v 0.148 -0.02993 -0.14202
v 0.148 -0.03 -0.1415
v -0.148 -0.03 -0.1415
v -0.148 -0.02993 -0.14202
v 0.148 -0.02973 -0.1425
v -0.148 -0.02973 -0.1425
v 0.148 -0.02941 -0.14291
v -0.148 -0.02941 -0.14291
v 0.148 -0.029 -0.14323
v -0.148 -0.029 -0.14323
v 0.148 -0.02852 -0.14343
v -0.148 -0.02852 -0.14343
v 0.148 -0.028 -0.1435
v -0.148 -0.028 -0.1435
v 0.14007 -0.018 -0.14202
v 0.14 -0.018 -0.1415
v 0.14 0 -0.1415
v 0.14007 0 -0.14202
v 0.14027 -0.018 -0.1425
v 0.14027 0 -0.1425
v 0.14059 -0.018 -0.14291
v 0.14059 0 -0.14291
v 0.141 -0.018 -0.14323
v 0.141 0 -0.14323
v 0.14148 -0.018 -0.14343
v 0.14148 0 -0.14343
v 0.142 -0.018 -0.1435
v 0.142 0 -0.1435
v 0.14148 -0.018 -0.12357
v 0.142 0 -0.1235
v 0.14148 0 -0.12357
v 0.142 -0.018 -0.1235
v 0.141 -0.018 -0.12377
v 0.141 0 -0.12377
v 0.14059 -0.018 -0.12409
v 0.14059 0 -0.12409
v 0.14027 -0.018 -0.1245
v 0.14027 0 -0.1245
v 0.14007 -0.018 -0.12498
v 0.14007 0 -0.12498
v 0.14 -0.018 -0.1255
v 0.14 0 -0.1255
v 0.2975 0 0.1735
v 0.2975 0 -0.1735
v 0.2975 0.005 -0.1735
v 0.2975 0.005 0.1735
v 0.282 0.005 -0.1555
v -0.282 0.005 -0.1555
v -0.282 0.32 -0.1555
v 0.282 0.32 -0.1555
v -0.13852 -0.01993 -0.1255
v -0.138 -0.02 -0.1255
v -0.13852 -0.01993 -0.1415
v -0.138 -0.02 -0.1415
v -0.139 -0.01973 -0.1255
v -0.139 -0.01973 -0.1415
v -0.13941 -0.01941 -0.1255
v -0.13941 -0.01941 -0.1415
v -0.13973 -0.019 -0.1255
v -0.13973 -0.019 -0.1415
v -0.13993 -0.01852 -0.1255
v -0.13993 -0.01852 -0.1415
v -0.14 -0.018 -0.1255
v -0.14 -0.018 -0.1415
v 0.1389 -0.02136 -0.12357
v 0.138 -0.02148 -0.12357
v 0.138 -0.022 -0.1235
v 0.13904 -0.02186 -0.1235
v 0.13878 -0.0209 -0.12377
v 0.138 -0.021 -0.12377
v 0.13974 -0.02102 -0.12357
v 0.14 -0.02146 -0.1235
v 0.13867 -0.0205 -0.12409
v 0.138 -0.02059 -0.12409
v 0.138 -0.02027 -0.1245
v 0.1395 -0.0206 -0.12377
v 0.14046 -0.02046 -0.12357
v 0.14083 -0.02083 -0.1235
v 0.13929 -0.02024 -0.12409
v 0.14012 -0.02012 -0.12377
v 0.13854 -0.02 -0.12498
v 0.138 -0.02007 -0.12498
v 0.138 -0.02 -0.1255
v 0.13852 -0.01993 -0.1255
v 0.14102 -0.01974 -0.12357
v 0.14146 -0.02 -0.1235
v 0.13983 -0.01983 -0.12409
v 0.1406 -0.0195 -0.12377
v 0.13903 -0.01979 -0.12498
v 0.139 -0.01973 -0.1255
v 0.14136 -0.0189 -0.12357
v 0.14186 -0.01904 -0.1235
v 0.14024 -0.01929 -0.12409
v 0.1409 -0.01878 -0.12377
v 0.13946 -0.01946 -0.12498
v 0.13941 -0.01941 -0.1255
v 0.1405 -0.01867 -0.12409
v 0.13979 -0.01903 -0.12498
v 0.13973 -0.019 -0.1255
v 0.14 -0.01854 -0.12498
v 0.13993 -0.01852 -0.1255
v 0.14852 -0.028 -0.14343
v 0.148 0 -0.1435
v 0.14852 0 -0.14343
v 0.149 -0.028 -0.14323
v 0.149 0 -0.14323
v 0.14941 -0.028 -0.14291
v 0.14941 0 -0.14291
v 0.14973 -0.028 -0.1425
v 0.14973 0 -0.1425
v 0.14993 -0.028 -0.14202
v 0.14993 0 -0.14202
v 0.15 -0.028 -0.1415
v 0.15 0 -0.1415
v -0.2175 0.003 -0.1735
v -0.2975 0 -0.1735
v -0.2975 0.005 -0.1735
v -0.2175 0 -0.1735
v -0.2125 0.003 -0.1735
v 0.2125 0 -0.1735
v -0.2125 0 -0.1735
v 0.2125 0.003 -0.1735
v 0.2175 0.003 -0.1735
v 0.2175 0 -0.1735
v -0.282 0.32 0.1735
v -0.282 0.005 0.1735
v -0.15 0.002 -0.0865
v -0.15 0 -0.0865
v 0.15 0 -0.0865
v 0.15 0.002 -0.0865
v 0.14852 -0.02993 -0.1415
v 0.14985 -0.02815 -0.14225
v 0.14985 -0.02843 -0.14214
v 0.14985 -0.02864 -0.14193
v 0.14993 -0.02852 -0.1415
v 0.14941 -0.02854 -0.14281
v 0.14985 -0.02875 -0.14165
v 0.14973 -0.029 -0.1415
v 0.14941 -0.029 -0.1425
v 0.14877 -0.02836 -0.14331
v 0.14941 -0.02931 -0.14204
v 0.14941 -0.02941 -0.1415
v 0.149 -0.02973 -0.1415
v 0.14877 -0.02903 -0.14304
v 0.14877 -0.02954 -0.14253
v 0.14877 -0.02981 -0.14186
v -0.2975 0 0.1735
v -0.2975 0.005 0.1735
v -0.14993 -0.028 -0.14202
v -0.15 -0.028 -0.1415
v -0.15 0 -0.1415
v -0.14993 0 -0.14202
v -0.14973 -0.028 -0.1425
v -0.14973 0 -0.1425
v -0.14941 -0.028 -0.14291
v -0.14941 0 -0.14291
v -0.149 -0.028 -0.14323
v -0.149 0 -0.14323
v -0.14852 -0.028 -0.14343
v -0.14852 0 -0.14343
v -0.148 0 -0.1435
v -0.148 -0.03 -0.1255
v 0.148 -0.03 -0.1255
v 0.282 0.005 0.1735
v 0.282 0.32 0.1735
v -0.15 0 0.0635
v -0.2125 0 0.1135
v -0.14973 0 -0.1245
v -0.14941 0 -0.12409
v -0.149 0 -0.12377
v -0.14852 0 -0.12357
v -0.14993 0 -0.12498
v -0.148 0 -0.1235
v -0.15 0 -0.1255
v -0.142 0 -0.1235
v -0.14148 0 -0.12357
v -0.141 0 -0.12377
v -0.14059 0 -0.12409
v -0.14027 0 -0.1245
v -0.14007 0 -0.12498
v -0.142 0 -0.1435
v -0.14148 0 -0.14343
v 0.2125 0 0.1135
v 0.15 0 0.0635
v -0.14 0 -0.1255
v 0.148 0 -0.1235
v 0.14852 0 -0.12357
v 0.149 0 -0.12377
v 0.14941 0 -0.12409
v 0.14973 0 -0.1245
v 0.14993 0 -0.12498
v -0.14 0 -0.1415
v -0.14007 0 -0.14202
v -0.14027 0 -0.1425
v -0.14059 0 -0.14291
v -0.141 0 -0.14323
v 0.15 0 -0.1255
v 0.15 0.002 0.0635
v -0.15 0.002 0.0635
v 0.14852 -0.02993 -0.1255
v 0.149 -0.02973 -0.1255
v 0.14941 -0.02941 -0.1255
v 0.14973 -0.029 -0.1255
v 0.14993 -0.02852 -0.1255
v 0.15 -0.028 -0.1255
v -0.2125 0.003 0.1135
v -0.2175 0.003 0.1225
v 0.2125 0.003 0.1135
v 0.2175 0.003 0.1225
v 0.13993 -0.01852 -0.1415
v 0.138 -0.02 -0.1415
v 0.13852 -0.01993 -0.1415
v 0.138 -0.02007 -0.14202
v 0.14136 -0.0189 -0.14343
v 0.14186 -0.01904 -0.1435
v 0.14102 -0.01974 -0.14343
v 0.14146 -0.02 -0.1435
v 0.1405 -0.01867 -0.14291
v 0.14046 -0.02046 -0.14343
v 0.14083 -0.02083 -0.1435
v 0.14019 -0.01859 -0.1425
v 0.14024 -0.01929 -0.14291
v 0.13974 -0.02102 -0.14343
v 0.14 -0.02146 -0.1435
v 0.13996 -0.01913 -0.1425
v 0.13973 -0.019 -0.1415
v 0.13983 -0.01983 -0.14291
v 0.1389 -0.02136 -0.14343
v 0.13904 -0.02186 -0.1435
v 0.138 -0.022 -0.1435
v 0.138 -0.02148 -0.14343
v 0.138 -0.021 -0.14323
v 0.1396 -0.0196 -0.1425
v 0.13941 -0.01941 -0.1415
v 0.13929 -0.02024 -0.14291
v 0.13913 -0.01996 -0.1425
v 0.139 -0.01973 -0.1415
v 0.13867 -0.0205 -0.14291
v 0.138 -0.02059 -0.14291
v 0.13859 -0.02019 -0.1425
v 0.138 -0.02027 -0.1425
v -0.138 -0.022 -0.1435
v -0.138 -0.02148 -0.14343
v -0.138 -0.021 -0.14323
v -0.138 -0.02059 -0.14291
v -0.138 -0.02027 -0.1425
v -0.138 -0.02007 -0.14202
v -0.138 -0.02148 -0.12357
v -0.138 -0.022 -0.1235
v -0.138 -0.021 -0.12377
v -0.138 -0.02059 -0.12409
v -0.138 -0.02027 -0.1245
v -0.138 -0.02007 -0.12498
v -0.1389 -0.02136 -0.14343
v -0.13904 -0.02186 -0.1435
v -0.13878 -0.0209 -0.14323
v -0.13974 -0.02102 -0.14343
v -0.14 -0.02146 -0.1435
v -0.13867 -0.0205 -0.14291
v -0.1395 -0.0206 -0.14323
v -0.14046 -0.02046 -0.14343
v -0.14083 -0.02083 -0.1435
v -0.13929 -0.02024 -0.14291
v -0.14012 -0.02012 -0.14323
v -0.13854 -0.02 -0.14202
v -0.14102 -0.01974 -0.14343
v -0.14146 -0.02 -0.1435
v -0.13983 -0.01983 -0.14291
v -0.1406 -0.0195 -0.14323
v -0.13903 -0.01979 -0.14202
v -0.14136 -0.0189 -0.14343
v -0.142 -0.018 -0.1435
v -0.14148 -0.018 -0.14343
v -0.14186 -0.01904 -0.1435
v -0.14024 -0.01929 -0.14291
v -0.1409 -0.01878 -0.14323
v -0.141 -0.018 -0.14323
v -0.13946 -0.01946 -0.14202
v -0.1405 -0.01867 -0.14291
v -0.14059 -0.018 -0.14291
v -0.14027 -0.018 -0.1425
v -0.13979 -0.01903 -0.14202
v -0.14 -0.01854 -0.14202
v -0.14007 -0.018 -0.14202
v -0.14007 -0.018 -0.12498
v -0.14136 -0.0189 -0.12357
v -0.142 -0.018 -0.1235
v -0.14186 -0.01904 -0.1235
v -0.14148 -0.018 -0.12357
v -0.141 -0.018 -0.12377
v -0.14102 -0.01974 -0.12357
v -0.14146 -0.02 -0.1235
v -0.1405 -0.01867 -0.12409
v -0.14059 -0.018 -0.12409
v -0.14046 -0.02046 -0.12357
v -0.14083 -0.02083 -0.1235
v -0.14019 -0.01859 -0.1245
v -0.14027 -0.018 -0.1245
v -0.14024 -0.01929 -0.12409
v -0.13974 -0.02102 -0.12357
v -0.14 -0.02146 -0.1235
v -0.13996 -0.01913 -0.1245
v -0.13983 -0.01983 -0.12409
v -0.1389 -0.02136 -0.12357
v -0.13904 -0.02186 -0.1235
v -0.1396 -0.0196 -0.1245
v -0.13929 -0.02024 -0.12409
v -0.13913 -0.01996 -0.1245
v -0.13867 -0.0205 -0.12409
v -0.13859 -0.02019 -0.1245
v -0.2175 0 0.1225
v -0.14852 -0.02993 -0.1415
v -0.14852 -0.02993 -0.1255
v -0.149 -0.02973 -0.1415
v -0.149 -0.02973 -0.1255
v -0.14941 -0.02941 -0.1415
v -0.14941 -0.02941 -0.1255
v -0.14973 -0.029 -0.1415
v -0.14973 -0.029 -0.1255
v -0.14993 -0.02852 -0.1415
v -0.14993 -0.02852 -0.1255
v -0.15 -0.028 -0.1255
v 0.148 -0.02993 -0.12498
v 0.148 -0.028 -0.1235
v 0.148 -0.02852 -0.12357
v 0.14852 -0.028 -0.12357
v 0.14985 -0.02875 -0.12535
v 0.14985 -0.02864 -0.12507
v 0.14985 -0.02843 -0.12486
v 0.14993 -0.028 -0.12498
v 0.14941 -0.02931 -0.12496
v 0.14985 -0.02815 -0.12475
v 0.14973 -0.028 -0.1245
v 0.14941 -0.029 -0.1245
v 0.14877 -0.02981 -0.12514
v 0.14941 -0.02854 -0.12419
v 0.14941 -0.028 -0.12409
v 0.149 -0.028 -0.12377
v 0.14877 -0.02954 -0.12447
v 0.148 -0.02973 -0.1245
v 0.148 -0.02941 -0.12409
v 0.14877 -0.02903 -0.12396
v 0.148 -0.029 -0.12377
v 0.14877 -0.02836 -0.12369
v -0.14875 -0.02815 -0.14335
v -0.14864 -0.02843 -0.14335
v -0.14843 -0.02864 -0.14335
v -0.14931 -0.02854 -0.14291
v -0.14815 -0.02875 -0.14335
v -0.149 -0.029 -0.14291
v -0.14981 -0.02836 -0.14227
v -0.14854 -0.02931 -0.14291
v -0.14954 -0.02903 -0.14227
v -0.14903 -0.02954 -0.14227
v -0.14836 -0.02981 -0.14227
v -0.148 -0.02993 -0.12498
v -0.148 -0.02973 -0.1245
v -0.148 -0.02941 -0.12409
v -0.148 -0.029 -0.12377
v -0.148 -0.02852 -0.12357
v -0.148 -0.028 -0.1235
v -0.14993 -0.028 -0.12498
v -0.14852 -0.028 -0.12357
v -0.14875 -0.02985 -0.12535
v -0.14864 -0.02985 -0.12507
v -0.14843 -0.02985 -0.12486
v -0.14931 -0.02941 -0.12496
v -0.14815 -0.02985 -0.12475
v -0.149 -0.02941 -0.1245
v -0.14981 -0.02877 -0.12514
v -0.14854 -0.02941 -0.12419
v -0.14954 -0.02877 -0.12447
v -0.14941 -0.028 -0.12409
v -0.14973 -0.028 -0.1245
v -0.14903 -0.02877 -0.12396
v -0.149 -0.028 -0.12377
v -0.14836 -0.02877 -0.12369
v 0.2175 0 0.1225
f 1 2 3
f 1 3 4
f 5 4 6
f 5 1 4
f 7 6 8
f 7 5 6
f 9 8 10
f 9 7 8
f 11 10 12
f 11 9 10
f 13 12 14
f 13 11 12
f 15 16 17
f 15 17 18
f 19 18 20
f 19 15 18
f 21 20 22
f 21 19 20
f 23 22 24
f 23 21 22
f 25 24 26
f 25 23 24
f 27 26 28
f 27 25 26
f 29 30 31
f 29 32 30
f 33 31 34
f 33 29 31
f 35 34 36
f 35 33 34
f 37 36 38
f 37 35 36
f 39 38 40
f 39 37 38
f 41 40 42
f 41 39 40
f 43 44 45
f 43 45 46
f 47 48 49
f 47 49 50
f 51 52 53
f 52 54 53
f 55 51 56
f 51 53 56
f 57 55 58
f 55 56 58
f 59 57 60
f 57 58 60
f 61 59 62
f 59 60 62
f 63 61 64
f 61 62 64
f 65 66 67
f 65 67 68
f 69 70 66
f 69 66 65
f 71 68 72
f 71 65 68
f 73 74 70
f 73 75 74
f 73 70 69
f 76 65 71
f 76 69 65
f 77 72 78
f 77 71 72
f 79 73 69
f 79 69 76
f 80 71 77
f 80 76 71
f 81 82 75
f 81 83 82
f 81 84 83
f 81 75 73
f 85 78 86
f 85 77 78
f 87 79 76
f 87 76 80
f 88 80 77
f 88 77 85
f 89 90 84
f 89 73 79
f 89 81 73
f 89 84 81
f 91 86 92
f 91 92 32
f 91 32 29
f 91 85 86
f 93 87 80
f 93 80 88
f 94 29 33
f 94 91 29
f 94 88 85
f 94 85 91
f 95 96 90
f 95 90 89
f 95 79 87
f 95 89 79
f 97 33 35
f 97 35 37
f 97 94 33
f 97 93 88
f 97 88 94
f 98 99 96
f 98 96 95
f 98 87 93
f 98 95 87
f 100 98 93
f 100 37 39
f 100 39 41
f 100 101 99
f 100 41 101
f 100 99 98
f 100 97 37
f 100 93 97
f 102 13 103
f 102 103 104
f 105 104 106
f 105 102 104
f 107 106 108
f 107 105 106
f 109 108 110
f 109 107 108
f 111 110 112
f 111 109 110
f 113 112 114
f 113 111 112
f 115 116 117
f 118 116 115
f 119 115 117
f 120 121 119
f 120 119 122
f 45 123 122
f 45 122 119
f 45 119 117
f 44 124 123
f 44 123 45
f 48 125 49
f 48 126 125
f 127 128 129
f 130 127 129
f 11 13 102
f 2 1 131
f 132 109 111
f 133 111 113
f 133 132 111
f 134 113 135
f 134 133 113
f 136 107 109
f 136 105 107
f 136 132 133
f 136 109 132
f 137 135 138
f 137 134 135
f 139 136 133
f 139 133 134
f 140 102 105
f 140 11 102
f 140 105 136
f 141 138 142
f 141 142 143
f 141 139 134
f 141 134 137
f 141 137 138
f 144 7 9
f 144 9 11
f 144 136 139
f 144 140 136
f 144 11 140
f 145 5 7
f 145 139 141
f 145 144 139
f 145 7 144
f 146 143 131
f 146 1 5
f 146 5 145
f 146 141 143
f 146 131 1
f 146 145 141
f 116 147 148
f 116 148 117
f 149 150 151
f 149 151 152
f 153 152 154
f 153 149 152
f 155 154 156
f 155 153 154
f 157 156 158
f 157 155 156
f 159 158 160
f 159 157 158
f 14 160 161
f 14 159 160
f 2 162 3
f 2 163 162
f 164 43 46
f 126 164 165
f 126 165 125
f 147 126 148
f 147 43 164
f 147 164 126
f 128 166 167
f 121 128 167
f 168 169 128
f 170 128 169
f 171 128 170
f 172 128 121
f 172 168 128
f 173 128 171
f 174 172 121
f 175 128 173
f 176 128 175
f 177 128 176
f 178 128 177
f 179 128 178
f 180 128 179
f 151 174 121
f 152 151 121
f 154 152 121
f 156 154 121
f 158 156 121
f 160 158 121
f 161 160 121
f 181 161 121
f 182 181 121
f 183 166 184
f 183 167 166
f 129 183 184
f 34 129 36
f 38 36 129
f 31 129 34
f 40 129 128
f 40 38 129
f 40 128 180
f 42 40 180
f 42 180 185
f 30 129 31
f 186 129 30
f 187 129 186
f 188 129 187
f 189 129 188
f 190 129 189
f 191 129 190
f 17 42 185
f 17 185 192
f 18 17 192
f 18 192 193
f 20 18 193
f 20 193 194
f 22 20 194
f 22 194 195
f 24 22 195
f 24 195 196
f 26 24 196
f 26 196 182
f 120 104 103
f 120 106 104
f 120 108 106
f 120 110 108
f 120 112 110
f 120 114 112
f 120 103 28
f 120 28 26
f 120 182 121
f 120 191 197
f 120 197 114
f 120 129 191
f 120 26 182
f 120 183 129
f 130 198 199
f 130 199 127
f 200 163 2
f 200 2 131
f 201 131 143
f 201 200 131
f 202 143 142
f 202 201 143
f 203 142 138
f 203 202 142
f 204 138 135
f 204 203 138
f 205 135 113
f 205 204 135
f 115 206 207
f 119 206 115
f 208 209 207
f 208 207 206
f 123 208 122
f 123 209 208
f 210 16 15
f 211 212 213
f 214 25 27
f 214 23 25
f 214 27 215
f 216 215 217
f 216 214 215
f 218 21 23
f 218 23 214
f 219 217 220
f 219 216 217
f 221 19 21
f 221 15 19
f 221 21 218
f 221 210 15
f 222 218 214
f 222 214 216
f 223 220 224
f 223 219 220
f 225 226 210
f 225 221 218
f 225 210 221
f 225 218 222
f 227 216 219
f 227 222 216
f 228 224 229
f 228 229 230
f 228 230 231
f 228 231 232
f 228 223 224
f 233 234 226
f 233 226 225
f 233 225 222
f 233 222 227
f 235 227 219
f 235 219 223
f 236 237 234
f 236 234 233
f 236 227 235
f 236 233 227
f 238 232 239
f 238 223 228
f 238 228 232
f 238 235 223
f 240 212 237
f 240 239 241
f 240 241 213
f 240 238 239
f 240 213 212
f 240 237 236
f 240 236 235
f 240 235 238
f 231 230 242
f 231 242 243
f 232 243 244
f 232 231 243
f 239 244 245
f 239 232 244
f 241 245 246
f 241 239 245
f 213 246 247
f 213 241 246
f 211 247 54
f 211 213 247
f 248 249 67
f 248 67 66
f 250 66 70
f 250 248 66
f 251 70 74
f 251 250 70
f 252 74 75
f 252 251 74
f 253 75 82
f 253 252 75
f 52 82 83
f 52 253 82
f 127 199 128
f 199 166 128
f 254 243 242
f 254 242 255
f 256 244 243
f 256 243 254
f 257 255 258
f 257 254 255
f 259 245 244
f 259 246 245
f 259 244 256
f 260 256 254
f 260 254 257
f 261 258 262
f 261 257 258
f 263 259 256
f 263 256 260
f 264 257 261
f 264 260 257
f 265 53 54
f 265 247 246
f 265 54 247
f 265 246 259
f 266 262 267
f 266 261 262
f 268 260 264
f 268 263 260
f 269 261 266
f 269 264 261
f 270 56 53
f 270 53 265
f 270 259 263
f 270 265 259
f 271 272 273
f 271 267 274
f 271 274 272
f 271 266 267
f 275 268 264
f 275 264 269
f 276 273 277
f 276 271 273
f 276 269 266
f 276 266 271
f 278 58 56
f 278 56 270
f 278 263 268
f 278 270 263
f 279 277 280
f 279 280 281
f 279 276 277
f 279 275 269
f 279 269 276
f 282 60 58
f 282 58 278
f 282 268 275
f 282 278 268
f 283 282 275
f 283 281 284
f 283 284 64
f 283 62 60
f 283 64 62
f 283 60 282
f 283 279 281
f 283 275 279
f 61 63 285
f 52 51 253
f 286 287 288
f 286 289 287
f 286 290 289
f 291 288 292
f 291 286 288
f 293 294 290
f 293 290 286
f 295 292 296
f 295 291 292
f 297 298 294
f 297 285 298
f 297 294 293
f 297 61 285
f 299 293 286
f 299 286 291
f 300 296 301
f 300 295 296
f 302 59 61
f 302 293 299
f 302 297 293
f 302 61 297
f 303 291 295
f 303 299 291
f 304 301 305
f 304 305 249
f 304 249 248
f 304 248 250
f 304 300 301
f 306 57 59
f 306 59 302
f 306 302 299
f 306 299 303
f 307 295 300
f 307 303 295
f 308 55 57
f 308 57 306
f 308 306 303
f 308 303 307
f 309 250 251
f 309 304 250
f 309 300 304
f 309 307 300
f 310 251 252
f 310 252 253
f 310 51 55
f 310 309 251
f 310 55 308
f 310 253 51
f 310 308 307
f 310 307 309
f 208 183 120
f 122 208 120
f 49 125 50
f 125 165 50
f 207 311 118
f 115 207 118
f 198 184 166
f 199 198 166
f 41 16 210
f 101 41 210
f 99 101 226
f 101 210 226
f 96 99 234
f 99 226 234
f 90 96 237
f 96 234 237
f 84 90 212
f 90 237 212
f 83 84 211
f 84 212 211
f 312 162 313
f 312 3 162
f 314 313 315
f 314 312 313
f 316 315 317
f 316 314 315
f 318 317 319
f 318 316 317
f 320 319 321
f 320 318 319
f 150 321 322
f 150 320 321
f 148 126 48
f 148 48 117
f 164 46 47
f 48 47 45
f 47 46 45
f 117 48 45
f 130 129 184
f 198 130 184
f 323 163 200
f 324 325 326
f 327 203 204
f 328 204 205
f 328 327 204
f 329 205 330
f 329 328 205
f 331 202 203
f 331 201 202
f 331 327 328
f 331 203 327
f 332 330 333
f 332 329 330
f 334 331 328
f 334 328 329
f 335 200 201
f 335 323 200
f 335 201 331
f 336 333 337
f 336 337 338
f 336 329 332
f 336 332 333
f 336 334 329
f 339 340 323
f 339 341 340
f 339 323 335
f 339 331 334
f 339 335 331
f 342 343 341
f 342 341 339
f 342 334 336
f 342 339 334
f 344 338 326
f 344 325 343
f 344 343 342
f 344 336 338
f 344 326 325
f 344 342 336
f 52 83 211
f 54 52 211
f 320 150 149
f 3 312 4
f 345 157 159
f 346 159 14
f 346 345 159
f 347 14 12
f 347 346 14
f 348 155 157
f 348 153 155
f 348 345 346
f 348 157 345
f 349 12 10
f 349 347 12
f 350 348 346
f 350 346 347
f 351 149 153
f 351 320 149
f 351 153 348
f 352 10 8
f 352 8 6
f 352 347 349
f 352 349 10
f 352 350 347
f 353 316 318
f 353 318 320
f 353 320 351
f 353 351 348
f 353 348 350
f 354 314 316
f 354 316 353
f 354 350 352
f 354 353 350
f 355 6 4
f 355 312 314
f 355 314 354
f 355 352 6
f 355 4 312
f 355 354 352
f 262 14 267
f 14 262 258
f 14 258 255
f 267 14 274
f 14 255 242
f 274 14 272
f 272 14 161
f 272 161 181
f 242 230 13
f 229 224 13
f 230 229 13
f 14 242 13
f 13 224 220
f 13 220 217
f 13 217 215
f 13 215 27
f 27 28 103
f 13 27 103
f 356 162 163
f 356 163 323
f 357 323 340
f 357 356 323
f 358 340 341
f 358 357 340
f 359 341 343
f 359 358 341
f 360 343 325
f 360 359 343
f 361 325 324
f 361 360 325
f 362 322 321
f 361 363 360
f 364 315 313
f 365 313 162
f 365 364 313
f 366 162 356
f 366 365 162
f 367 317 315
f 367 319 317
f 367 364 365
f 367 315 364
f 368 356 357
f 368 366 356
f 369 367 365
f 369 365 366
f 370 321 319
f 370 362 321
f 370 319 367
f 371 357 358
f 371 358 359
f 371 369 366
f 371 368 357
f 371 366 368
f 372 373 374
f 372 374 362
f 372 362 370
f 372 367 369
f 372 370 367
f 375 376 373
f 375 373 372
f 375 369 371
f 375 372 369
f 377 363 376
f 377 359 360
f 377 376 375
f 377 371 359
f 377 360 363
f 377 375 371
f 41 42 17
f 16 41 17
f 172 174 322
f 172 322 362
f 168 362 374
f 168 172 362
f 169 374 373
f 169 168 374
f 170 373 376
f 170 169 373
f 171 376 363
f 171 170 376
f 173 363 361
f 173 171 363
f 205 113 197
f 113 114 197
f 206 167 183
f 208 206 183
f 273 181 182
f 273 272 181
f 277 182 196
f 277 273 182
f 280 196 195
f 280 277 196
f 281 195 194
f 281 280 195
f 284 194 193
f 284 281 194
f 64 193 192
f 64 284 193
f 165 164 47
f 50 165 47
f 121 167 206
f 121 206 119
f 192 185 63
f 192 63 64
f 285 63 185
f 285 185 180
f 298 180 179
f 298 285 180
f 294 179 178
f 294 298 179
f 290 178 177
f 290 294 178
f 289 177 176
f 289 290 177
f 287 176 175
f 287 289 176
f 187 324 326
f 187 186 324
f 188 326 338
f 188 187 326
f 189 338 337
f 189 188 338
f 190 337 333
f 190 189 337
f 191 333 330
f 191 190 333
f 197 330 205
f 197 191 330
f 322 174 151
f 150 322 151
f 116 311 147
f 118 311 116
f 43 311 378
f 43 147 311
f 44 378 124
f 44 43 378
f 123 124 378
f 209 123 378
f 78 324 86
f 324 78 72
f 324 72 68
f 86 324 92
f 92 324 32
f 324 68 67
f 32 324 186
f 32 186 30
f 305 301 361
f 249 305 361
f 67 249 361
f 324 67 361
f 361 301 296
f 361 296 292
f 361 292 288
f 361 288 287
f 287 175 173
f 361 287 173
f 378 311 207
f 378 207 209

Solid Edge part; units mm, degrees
sketch "Sketch1" plane through (0, 0, 0) normal (0, -1, 0) x (1, 0, 0)
  line L0 (-0.2975, -0.1735) -> (0.2975, -0.1735)
  line L1 (0.2975, -0.1735) -> (0.2975, 0.1735)
  line L2 (0.2975, 0.1735) -> (-0.2975, 0.1735)
  line L3 (-0.2975, 0.1735) -> (-0.2975, -0.1735)
  dimension "D1" = 0.595
  dimension "D2" = 0.347
extrude "Protrusion1" add sketch "Sketch1" against normal blind 0.32
sketch "Sketch2" plane through (0, 0.005, 0) normal (0, -1, 0) x (1, 0, 0)
  line L0 (0.2975, 0.1735) -> (0.282, 0.1735)
  line L1 (0.282, 0.1735) -> (0.282, -0.1555)
  line L2 (-0.282, -0.1555) -> (0.282, -0.1555)
  line L3 (-0.282, 0.1735) -> (-0.282, -0.1555)
  line L4 (-0.282, 0.1735) -> (-0.2975, 0.1735)
  line L5 (-0.2975, 0.1735) -> (-0.2975, -0.1735)
  line L6 (-0.2975, -0.1735) -> (0.2975, -0.1735)
  line L7 (0.2975, -0.1735) -> (0.2975, 0.1735)
  dimension "D1" = 0.018
  dimension "D2" = 0.564
extrude "Ausschnitt_1" cut sketch "Sketch2" against normal through all
sketch "Sketch3" plane through (0, 0, 0) normal (0, -1, 0) x (1, 0, 0)
  line L0 (-0.2975, 0.1235) -> (-0.2975, 0.1225) construction
  line L1 (-0.2975, 0.1225) -> (-0.2175, 0.1225)
  line L2 (-0.2175, 0.1225) -> (-0.2175, -0.1735)
  line L3 (-0.2175, -0.1735) -> (-0.2125, -0.1735)
  line L4 (-0.2125, 0.1135) -> (-0.2125, -0.1735)
  line L5 (-0.2125, 0.1135) -> (0.2125, 0.1135)
  line L6 (0.2125, 0.1135) -> (0.2125, -0.1735)
  line L7 (0.2125, -0.1735) -> (0.2175, -0.1735)
  line L8 (0.2175, -0.1735) -> (0.2175, 0.1225)
  line L9 (0.2175, 0.1225) -> (0.2975, 0.1225)
  line L10 (0.2975, 0.1225) -> (0.2975, 0.1235) construction
  line L11 (-0.2975, 0.1235) -> (0.2975, 0.1235)
  dimension "D1" = 0.08
  dimension "D2" = 0.005
  dimension "D3" = 0.001
  dimension "D4" = 0.01
  dimension "D5" = 0.05
extrude "Ausschnitt_2" cut sketch "Sketch3" against normal blind 0.003
sketch "Sketch4" plane through (0, 0, -0.03) normal (0, -1, 0) x (1, 0, 0)
  line L0 (-0.15, -0.0565) -> (0.15, -0.0565)
  line L1 (0.15, -0.0565) -> (0.15, 0.0935)
  line L2 (0.15, 0.0935) -> (-0.15, 0.0935)
  line L3 (-0.15, 0.0935) -> (-0.15, -0.0565)
  dimension "D1" = 0.05
  dimension "D2" = 0.3
  dimension "D3" = 0.15
extrude "Ausschnitt_3" cut sketch "Sketch4" against normal blind 0.002
sketch "Sketch5" plane through (0, 0, -0.03) normal (0, -1, 0) x (1, 0, 0)
  line L0 (0.15, -0.1135) -> (0.15, -0.0935)
  line L1 (0.15, -0.0935) -> (0.14, -0.0935)
  line L2 (0.14, -0.0935) -> (0.14, -0.1135)
  line L3 (0.14, -0.1135) -> (0.15, -0.1135)
  line L4 (-0.15, -0.0935) -> (-0.15, -0.1135)
  line L5 (-0.15, -0.1135) -> (-0.14, -0.1135)
  line L6 (-0.14, -0.0935) -> (-0.14, -0.1135)
  line L7 (-0.14, -0.0935) -> (-0.15, -0.0935)
  dimension "D1" = 0.02
  dimension "D2" = 0.03
  dimension "D3" = 0.01
extrude "Ausprägung_2" add sketch "Sketch5" along normal blind 0.02
sketch "Sketch6" plane through (-0.145, -0.02, -0.1335) normal (0, -1, 0) x (1, 0, 0)
  line L0 (0.295, 0.01) -> (-0.005, 0.01)
  line L1 (-0.005, 0.01) -> (-0.005, -0.01)
  line L2 (-0.005, -0.01) -> (0.295, -0.01)
  line L3 (0.295, -0.01) -> (0.295, 0.01)
extrude "Ausprägung_3" add sketch "Sketch6" along normal blind 0.01
fillet "Verrundung_1" radius 0.002 16 edges at (-0.15, -0.015, -0.1235) (-0.14, -0.01, -0.1235) (0, -0.02, -0.1235) (0, -0.03, -0.1235) (-0.15, -0.03, -0.1335) (0, -0.03, -0.1435) (0.15, -0.03, -0.1335) (0.15, -0.015, -0.1235) (0.14, -0.01, -0.1235) (0.15, -0.015, -0.1435) (0.14, -0.01, -0.1435) (0, -0.02, -0.1435) (-0.15, -0.015, -0.1435) (-0.14, -0.01, -0.1435) (-0.14, -0.02, -0.1335) (0.14, -0.02, -0.1335)
